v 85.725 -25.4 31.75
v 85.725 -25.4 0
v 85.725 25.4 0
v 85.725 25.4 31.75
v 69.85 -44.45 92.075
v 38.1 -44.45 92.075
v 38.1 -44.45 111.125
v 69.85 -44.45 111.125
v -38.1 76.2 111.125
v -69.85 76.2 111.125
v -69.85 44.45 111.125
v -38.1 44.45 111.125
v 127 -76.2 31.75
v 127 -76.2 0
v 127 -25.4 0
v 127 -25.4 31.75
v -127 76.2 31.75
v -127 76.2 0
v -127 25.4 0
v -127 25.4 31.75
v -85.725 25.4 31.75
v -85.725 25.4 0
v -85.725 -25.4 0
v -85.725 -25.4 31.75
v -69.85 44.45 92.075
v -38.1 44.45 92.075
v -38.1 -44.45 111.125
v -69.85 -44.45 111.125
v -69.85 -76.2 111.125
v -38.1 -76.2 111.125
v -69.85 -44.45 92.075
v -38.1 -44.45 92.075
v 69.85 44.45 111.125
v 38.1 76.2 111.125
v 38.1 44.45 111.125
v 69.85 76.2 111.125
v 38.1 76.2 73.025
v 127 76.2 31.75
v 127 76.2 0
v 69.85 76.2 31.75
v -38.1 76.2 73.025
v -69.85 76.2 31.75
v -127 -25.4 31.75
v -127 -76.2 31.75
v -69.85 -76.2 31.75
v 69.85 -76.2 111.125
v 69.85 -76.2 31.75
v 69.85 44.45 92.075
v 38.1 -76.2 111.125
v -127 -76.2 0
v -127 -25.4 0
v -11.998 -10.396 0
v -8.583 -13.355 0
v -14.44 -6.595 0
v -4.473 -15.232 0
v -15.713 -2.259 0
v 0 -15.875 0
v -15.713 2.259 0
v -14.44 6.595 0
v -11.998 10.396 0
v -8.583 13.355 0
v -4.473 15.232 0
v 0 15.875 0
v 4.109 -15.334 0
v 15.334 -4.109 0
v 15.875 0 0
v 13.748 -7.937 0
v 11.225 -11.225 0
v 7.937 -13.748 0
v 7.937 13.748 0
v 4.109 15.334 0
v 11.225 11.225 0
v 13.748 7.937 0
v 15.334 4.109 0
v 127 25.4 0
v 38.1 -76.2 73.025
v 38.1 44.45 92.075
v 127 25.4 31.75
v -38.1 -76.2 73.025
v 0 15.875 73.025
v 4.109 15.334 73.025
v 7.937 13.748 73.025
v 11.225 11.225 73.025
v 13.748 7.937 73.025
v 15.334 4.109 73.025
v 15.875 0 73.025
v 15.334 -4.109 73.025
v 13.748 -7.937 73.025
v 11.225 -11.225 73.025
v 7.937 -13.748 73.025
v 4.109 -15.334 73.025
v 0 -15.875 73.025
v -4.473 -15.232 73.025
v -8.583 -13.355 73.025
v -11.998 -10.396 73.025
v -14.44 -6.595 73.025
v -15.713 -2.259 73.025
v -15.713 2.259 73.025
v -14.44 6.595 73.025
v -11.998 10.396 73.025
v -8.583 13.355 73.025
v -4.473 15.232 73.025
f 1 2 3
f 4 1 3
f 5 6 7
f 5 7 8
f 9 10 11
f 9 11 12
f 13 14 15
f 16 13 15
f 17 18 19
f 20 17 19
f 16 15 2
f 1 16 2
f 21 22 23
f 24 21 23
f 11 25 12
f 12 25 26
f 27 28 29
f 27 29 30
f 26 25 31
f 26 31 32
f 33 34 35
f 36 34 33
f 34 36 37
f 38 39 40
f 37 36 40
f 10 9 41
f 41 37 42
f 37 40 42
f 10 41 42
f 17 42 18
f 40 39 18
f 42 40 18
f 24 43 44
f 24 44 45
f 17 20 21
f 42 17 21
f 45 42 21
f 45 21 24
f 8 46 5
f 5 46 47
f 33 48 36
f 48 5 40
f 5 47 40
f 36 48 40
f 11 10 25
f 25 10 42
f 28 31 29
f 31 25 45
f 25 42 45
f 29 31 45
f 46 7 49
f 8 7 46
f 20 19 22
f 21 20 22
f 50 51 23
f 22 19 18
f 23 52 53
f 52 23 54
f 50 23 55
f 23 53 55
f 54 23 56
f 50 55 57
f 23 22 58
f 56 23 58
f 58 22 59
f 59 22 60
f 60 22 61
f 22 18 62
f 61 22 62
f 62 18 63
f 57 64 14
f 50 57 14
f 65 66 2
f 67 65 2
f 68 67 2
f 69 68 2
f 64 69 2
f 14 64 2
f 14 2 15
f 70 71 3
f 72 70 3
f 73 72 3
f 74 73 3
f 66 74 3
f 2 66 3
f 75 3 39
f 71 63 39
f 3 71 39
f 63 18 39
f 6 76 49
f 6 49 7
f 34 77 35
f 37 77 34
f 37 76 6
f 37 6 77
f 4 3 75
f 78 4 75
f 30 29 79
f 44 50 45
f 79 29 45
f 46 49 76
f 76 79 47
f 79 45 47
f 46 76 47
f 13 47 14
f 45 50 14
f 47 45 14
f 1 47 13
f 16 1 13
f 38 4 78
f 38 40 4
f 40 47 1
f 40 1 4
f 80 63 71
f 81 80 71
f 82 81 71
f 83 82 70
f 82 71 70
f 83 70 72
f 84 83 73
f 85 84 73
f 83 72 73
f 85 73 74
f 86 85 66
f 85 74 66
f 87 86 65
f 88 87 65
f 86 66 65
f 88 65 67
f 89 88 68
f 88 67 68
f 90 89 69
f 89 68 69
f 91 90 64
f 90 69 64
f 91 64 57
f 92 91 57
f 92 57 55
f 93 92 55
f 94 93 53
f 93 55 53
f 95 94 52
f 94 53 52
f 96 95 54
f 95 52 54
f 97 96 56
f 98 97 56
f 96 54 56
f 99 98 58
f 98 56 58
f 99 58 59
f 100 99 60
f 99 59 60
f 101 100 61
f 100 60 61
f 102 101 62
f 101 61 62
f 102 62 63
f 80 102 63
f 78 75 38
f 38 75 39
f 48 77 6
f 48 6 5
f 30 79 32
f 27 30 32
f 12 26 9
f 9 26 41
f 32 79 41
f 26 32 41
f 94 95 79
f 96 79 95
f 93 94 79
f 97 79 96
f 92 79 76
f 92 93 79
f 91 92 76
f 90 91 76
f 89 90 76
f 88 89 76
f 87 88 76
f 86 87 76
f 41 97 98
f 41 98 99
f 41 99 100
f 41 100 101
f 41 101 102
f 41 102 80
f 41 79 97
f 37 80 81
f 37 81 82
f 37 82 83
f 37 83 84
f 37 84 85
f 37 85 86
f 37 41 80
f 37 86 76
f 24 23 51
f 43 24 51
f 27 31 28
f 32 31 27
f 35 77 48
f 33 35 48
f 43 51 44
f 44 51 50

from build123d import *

# Parameters (mm, degrees)
F0_W     = 31.75
F0_H     = 31.75
F1_DEPTH = 31.75
F2_W     = 31.75
F2_H     = 31.75
F3_DEPTH = 79.375
F4_DEPTH = 60.325
F5_DEPTH = 41.275


with BuildPart() as f1:
    # F0 (on Top) → F1 (new body)
    with BuildSketch(Plane.XY):
        Polygon((-69.85, 44.45), (-69.85, 76.2), (-127, 76.2), (-127, 25.4), (-85.725, 25.4), (-85.725, -25.4), (-127, -25.4), (-127, -76.2), (-69.85, -76.2), (-69.85, -44.45), (-69.85, -25.4), (-69.85, 25.4), align=None)
        Polygon((127, 25.4), (127, 76.2), (69.85, 76.2), (69.85, 44.45), (69.85, 25.4), (69.85, -25.4), (69.85, -44.45), (69.85, -76.2), (127, -76.2), (127, -25.4), (85.725, -25.4), (85.725, 25.4), align=None)
        Polygon((-38.1, -44.45), (-38.1, 44.45), (-69.85, 44.45), (-69.85, 25.4), (-69.85, -25.4), (-69.85, -44.45), align=None)
        with Locations((-53.975, 60.325)):
            Rectangle(F0_W, F0_H)
        with Locations((-53.975, -60.325)):
            Rectangle(F0_W, F0_H)
        with BuildLine():
            Line((0, 15.875), (0, 76.2))
            Line((0, 76.2), (-38.1, 76.2))
            Line((-38.1, 76.2), (-38.1, 44.45))
            Line((-38.1, 44.45), (-38.1, -44.45))
            Line((-38.1, -44.45), (-38.1, -76.2))
            Line((-38.1, -76.2), (0, -76.2))
            Line((0, -76.2), (0, -15.875))
            ThreePointArc((0, -15.875), (-15.875, 0), (0, 15.875))
        make_face()
        with BuildLine():
            Line((38.1, 44.45), (38.1, 76.2))
            Line((38.1, 76.2), (0, 76.2))
            Line((0, 76.2), (0, 15.875))
            ThreePointArc((0, 15.875), (11.2253201513, 11.2253201513), (15.875, 0))
            ThreePointArc((15.875, 0), (11.2253201513, -11.2253201513), (0, -15.875))
            Line((0, -15.875), (0, -76.2))
            Line((0, -76.2), (38.1, -76.2))
            Line((38.1, -76.2), (38.1, -44.45))
            Line((38.1, -44.45), (38.1, 44.45))
        make_face()
        with Locations((53.975, -60.325)):
            Rectangle(F0_W, F0_H)
        Polygon((69.85, 25.4), (69.85, 44.45), (38.1, 44.45), (38.1, -44.45), (69.85, -44.45), (69.85, -25.4), align=None)
        with Locations((53.975, 60.325)):
            Rectangle(F0_W, F0_H)
    extrude(amount=F1_DEPTH)

    # F2 (on face) → F3 (join)
    with BuildSketch(Plane.XY.offset(31.75)):
        with Locations((-53.975, -60.325)):
            Rectangle(F2_W, F2_H)
        with Locations((53.975, -60.325)):
            Rectangle(F2_W, F2_H)
        with Locations((53.975, 60.325)):
            Rectangle(F2_W, F2_H)
        with Locations((-53.975, 60.325)):
            Rectangle(F2_W, F2_H)
    extrude(amount=F3_DEPTH)

    # F2 (on face) → F4 (join)
    with BuildSketch(Plane.XY.offset(31.75)):
        Polygon((-38.1, -44.45), (-38.1, 44.45), (-69.85, 44.45), (-69.85, 25.4), (-69.85, -25.4), (-69.85, -44.45), align=None)
        Polygon((69.85, 25.4), (69.85, 44.45), (38.1, 44.45), (38.1, -44.45), (69.85, -44.45), (69.85, -25.4), align=None)
    extrude(amount=F4_DEPTH)

    # F5 (add): a face of the model
    f5_faces = [f1.faces().sort_by_distance(p)[0] for p in [
        (-36.3961162011, 0, 31.75),
    ]]
    extrude(f5_faces, amount=F5_DEPTH)


solid = f1.part
